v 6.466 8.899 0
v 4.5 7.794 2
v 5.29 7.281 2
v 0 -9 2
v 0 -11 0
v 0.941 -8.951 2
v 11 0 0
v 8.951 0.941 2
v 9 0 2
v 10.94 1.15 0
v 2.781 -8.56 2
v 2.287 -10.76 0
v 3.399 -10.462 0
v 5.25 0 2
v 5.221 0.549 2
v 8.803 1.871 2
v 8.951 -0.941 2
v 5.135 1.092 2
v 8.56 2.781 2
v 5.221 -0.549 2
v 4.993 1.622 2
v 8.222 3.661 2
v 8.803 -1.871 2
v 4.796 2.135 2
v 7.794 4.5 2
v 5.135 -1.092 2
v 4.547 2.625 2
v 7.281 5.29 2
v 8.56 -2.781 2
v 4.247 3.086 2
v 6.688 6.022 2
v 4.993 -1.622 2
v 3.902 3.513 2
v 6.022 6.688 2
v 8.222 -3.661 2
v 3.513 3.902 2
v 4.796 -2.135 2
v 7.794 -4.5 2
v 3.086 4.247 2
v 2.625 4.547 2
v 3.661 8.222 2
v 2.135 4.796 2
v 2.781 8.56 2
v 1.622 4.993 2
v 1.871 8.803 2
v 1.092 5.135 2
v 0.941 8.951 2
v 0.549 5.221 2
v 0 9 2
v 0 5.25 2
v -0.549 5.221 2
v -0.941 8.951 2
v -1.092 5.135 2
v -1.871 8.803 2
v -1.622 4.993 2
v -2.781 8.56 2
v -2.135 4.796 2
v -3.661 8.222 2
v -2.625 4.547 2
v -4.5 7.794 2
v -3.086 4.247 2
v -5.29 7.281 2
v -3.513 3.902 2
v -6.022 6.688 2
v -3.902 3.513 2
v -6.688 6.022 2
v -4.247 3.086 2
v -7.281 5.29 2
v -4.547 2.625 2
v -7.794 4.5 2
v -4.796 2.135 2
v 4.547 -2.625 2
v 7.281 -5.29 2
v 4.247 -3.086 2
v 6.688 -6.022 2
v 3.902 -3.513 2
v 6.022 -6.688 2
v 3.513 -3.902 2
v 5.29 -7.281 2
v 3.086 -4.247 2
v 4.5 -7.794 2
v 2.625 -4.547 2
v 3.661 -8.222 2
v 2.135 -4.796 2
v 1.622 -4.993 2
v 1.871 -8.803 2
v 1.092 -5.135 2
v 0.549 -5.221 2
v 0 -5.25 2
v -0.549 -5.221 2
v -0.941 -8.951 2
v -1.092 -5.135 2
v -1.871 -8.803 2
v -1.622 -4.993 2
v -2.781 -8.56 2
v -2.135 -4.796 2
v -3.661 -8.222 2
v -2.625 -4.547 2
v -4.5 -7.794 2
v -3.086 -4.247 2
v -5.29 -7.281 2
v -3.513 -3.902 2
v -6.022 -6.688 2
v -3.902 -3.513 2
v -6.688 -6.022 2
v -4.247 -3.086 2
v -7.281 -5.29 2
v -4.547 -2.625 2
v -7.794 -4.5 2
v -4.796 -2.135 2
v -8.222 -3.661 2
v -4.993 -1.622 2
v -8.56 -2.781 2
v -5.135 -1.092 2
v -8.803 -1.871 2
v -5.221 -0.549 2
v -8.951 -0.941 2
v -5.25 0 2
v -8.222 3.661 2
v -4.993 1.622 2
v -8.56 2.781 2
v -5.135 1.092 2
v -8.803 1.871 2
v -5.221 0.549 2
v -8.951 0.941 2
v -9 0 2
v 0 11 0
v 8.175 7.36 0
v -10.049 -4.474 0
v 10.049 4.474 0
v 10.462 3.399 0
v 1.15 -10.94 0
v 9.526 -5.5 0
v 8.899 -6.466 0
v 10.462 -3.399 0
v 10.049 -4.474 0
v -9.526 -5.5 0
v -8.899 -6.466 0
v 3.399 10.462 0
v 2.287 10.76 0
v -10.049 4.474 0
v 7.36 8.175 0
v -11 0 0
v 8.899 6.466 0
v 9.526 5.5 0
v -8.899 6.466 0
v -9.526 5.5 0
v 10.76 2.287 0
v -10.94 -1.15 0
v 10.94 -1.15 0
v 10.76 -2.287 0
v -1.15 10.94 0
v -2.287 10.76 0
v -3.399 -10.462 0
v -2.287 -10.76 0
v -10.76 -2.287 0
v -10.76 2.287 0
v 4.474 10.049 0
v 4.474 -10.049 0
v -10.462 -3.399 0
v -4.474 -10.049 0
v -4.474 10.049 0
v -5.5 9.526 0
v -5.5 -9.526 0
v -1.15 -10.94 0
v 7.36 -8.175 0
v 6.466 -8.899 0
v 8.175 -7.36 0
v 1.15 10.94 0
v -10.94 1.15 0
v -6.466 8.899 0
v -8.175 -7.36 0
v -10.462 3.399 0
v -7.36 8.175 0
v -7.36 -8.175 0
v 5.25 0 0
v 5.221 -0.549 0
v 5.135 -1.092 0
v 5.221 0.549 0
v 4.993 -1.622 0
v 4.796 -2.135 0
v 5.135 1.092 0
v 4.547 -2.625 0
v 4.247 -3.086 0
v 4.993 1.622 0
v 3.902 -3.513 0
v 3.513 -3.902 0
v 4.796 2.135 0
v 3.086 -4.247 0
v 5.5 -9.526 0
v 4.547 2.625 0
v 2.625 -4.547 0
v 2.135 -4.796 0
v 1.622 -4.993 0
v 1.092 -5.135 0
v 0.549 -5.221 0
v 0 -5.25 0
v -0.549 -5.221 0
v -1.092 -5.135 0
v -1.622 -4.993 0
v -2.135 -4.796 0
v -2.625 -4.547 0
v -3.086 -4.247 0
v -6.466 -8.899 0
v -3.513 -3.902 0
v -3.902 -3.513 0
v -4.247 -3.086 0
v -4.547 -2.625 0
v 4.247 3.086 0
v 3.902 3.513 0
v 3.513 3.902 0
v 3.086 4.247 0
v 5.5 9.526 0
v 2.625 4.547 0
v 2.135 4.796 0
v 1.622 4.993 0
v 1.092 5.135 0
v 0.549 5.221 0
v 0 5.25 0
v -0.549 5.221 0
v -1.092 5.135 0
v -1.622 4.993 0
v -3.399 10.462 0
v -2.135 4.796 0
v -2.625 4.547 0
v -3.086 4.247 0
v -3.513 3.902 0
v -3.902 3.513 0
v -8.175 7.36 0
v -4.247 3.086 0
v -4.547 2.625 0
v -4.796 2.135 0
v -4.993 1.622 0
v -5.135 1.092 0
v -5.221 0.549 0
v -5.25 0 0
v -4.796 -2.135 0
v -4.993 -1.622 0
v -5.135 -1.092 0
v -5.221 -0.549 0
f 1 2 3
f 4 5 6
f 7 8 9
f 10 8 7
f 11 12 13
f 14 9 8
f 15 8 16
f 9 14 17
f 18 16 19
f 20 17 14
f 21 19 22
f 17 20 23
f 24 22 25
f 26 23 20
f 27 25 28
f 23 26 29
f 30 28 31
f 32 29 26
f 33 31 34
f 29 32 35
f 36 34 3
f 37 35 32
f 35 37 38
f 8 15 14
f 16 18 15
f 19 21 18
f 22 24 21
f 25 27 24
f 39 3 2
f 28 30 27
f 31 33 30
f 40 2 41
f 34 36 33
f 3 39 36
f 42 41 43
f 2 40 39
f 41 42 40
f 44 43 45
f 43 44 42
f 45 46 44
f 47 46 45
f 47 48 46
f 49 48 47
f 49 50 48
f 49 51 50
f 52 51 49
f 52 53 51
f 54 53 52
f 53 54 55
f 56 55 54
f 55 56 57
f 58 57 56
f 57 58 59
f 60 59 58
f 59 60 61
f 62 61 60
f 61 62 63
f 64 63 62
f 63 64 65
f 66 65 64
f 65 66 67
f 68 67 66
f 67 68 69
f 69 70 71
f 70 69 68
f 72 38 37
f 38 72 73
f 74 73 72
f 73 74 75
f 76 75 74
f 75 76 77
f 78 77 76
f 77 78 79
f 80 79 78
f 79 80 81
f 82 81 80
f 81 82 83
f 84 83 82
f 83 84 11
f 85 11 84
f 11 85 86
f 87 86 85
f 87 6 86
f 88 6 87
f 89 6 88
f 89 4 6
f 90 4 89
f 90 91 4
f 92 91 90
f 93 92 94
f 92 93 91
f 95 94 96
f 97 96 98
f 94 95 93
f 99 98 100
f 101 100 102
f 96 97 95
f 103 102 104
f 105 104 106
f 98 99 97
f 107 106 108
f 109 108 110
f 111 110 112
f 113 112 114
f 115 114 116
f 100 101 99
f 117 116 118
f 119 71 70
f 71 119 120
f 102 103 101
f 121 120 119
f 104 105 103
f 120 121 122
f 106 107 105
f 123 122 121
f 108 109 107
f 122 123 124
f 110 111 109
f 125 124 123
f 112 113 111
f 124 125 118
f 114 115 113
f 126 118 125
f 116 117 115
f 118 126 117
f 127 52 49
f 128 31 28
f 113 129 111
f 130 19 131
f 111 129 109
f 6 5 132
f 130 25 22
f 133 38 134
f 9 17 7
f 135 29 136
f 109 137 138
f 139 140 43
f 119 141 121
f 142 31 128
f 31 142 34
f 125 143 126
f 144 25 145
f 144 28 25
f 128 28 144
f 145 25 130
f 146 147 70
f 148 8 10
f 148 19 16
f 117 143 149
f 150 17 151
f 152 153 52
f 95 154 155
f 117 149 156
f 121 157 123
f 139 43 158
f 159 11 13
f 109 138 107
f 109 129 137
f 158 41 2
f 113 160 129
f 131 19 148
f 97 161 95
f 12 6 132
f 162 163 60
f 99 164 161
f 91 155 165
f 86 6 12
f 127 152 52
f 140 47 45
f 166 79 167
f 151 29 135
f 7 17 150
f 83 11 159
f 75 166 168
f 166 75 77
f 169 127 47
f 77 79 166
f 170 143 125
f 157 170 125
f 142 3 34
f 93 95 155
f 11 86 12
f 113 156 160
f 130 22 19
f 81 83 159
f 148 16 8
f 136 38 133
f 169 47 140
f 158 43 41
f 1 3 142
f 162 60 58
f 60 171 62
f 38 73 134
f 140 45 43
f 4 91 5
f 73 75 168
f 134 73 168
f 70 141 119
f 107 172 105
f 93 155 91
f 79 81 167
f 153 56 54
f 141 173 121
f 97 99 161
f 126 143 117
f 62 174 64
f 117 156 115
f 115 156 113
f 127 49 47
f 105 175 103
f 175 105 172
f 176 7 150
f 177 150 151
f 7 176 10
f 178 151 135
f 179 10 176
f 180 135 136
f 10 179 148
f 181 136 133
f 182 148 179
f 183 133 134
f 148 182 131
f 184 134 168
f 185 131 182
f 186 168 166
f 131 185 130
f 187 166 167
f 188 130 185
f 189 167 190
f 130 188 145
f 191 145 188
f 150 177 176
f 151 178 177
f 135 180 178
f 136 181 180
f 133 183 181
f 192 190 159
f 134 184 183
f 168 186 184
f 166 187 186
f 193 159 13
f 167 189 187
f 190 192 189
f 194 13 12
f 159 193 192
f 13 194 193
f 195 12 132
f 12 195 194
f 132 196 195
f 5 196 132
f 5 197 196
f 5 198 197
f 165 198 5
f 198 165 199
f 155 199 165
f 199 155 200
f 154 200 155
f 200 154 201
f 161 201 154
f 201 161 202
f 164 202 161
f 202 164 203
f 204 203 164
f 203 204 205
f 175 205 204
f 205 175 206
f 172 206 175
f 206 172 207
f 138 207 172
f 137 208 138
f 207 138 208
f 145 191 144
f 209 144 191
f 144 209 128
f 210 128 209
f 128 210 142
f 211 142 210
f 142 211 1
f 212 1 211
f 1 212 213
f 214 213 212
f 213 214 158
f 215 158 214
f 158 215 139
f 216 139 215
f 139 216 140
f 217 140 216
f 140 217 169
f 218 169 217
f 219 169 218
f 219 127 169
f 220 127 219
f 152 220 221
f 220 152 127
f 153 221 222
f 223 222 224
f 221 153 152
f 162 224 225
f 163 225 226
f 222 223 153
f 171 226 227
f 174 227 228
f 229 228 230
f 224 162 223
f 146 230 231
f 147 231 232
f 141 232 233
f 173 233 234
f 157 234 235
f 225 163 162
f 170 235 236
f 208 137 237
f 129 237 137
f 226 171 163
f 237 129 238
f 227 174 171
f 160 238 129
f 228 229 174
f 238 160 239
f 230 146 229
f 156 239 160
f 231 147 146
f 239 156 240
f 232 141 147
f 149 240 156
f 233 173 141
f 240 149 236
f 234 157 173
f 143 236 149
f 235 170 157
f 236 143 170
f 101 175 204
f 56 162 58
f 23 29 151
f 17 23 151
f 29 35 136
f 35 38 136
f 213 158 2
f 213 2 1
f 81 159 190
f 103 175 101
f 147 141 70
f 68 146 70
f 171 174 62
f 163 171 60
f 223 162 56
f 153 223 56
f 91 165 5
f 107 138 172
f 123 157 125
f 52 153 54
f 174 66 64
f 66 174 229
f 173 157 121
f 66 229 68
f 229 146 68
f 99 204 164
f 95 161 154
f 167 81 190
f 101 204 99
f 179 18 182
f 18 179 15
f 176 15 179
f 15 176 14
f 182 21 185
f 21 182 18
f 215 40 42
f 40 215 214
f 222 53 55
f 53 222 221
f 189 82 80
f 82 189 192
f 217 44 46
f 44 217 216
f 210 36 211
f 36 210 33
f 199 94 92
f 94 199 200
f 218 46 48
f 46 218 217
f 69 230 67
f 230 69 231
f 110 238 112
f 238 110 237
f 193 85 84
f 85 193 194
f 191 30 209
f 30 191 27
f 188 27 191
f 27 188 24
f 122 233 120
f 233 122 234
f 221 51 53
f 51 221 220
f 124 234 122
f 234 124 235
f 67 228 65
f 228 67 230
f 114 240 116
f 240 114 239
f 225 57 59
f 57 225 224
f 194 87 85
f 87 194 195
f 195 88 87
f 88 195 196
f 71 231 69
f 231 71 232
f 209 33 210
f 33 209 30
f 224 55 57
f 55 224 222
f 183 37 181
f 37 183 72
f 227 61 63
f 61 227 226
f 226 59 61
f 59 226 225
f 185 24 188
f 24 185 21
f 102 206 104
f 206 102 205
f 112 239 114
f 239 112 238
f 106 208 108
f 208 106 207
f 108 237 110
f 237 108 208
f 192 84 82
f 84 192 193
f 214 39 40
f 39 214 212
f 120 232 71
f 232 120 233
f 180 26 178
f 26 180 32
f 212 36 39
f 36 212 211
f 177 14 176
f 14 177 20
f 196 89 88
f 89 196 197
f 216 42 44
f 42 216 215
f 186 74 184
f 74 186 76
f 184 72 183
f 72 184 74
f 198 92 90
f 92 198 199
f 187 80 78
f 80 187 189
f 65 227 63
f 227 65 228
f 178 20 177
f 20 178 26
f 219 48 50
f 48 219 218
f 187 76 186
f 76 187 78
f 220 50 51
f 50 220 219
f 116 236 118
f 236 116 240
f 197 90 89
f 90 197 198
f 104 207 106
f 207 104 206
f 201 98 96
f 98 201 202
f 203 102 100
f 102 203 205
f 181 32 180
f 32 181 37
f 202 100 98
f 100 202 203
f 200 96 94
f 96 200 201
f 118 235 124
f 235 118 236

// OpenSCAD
// Conical spring washer.
$fn = 60;
eps = 0.02;
inner_d = 10.5;
outer_d = 22;
thickness = 2;
difference() {
    cylinder(d1=outer_d,d2=outer_d-2*thickness,h=thickness);
    translate([0,0,-eps]) cylinder(d=inner_d,h=thickness+2*eps);
}
